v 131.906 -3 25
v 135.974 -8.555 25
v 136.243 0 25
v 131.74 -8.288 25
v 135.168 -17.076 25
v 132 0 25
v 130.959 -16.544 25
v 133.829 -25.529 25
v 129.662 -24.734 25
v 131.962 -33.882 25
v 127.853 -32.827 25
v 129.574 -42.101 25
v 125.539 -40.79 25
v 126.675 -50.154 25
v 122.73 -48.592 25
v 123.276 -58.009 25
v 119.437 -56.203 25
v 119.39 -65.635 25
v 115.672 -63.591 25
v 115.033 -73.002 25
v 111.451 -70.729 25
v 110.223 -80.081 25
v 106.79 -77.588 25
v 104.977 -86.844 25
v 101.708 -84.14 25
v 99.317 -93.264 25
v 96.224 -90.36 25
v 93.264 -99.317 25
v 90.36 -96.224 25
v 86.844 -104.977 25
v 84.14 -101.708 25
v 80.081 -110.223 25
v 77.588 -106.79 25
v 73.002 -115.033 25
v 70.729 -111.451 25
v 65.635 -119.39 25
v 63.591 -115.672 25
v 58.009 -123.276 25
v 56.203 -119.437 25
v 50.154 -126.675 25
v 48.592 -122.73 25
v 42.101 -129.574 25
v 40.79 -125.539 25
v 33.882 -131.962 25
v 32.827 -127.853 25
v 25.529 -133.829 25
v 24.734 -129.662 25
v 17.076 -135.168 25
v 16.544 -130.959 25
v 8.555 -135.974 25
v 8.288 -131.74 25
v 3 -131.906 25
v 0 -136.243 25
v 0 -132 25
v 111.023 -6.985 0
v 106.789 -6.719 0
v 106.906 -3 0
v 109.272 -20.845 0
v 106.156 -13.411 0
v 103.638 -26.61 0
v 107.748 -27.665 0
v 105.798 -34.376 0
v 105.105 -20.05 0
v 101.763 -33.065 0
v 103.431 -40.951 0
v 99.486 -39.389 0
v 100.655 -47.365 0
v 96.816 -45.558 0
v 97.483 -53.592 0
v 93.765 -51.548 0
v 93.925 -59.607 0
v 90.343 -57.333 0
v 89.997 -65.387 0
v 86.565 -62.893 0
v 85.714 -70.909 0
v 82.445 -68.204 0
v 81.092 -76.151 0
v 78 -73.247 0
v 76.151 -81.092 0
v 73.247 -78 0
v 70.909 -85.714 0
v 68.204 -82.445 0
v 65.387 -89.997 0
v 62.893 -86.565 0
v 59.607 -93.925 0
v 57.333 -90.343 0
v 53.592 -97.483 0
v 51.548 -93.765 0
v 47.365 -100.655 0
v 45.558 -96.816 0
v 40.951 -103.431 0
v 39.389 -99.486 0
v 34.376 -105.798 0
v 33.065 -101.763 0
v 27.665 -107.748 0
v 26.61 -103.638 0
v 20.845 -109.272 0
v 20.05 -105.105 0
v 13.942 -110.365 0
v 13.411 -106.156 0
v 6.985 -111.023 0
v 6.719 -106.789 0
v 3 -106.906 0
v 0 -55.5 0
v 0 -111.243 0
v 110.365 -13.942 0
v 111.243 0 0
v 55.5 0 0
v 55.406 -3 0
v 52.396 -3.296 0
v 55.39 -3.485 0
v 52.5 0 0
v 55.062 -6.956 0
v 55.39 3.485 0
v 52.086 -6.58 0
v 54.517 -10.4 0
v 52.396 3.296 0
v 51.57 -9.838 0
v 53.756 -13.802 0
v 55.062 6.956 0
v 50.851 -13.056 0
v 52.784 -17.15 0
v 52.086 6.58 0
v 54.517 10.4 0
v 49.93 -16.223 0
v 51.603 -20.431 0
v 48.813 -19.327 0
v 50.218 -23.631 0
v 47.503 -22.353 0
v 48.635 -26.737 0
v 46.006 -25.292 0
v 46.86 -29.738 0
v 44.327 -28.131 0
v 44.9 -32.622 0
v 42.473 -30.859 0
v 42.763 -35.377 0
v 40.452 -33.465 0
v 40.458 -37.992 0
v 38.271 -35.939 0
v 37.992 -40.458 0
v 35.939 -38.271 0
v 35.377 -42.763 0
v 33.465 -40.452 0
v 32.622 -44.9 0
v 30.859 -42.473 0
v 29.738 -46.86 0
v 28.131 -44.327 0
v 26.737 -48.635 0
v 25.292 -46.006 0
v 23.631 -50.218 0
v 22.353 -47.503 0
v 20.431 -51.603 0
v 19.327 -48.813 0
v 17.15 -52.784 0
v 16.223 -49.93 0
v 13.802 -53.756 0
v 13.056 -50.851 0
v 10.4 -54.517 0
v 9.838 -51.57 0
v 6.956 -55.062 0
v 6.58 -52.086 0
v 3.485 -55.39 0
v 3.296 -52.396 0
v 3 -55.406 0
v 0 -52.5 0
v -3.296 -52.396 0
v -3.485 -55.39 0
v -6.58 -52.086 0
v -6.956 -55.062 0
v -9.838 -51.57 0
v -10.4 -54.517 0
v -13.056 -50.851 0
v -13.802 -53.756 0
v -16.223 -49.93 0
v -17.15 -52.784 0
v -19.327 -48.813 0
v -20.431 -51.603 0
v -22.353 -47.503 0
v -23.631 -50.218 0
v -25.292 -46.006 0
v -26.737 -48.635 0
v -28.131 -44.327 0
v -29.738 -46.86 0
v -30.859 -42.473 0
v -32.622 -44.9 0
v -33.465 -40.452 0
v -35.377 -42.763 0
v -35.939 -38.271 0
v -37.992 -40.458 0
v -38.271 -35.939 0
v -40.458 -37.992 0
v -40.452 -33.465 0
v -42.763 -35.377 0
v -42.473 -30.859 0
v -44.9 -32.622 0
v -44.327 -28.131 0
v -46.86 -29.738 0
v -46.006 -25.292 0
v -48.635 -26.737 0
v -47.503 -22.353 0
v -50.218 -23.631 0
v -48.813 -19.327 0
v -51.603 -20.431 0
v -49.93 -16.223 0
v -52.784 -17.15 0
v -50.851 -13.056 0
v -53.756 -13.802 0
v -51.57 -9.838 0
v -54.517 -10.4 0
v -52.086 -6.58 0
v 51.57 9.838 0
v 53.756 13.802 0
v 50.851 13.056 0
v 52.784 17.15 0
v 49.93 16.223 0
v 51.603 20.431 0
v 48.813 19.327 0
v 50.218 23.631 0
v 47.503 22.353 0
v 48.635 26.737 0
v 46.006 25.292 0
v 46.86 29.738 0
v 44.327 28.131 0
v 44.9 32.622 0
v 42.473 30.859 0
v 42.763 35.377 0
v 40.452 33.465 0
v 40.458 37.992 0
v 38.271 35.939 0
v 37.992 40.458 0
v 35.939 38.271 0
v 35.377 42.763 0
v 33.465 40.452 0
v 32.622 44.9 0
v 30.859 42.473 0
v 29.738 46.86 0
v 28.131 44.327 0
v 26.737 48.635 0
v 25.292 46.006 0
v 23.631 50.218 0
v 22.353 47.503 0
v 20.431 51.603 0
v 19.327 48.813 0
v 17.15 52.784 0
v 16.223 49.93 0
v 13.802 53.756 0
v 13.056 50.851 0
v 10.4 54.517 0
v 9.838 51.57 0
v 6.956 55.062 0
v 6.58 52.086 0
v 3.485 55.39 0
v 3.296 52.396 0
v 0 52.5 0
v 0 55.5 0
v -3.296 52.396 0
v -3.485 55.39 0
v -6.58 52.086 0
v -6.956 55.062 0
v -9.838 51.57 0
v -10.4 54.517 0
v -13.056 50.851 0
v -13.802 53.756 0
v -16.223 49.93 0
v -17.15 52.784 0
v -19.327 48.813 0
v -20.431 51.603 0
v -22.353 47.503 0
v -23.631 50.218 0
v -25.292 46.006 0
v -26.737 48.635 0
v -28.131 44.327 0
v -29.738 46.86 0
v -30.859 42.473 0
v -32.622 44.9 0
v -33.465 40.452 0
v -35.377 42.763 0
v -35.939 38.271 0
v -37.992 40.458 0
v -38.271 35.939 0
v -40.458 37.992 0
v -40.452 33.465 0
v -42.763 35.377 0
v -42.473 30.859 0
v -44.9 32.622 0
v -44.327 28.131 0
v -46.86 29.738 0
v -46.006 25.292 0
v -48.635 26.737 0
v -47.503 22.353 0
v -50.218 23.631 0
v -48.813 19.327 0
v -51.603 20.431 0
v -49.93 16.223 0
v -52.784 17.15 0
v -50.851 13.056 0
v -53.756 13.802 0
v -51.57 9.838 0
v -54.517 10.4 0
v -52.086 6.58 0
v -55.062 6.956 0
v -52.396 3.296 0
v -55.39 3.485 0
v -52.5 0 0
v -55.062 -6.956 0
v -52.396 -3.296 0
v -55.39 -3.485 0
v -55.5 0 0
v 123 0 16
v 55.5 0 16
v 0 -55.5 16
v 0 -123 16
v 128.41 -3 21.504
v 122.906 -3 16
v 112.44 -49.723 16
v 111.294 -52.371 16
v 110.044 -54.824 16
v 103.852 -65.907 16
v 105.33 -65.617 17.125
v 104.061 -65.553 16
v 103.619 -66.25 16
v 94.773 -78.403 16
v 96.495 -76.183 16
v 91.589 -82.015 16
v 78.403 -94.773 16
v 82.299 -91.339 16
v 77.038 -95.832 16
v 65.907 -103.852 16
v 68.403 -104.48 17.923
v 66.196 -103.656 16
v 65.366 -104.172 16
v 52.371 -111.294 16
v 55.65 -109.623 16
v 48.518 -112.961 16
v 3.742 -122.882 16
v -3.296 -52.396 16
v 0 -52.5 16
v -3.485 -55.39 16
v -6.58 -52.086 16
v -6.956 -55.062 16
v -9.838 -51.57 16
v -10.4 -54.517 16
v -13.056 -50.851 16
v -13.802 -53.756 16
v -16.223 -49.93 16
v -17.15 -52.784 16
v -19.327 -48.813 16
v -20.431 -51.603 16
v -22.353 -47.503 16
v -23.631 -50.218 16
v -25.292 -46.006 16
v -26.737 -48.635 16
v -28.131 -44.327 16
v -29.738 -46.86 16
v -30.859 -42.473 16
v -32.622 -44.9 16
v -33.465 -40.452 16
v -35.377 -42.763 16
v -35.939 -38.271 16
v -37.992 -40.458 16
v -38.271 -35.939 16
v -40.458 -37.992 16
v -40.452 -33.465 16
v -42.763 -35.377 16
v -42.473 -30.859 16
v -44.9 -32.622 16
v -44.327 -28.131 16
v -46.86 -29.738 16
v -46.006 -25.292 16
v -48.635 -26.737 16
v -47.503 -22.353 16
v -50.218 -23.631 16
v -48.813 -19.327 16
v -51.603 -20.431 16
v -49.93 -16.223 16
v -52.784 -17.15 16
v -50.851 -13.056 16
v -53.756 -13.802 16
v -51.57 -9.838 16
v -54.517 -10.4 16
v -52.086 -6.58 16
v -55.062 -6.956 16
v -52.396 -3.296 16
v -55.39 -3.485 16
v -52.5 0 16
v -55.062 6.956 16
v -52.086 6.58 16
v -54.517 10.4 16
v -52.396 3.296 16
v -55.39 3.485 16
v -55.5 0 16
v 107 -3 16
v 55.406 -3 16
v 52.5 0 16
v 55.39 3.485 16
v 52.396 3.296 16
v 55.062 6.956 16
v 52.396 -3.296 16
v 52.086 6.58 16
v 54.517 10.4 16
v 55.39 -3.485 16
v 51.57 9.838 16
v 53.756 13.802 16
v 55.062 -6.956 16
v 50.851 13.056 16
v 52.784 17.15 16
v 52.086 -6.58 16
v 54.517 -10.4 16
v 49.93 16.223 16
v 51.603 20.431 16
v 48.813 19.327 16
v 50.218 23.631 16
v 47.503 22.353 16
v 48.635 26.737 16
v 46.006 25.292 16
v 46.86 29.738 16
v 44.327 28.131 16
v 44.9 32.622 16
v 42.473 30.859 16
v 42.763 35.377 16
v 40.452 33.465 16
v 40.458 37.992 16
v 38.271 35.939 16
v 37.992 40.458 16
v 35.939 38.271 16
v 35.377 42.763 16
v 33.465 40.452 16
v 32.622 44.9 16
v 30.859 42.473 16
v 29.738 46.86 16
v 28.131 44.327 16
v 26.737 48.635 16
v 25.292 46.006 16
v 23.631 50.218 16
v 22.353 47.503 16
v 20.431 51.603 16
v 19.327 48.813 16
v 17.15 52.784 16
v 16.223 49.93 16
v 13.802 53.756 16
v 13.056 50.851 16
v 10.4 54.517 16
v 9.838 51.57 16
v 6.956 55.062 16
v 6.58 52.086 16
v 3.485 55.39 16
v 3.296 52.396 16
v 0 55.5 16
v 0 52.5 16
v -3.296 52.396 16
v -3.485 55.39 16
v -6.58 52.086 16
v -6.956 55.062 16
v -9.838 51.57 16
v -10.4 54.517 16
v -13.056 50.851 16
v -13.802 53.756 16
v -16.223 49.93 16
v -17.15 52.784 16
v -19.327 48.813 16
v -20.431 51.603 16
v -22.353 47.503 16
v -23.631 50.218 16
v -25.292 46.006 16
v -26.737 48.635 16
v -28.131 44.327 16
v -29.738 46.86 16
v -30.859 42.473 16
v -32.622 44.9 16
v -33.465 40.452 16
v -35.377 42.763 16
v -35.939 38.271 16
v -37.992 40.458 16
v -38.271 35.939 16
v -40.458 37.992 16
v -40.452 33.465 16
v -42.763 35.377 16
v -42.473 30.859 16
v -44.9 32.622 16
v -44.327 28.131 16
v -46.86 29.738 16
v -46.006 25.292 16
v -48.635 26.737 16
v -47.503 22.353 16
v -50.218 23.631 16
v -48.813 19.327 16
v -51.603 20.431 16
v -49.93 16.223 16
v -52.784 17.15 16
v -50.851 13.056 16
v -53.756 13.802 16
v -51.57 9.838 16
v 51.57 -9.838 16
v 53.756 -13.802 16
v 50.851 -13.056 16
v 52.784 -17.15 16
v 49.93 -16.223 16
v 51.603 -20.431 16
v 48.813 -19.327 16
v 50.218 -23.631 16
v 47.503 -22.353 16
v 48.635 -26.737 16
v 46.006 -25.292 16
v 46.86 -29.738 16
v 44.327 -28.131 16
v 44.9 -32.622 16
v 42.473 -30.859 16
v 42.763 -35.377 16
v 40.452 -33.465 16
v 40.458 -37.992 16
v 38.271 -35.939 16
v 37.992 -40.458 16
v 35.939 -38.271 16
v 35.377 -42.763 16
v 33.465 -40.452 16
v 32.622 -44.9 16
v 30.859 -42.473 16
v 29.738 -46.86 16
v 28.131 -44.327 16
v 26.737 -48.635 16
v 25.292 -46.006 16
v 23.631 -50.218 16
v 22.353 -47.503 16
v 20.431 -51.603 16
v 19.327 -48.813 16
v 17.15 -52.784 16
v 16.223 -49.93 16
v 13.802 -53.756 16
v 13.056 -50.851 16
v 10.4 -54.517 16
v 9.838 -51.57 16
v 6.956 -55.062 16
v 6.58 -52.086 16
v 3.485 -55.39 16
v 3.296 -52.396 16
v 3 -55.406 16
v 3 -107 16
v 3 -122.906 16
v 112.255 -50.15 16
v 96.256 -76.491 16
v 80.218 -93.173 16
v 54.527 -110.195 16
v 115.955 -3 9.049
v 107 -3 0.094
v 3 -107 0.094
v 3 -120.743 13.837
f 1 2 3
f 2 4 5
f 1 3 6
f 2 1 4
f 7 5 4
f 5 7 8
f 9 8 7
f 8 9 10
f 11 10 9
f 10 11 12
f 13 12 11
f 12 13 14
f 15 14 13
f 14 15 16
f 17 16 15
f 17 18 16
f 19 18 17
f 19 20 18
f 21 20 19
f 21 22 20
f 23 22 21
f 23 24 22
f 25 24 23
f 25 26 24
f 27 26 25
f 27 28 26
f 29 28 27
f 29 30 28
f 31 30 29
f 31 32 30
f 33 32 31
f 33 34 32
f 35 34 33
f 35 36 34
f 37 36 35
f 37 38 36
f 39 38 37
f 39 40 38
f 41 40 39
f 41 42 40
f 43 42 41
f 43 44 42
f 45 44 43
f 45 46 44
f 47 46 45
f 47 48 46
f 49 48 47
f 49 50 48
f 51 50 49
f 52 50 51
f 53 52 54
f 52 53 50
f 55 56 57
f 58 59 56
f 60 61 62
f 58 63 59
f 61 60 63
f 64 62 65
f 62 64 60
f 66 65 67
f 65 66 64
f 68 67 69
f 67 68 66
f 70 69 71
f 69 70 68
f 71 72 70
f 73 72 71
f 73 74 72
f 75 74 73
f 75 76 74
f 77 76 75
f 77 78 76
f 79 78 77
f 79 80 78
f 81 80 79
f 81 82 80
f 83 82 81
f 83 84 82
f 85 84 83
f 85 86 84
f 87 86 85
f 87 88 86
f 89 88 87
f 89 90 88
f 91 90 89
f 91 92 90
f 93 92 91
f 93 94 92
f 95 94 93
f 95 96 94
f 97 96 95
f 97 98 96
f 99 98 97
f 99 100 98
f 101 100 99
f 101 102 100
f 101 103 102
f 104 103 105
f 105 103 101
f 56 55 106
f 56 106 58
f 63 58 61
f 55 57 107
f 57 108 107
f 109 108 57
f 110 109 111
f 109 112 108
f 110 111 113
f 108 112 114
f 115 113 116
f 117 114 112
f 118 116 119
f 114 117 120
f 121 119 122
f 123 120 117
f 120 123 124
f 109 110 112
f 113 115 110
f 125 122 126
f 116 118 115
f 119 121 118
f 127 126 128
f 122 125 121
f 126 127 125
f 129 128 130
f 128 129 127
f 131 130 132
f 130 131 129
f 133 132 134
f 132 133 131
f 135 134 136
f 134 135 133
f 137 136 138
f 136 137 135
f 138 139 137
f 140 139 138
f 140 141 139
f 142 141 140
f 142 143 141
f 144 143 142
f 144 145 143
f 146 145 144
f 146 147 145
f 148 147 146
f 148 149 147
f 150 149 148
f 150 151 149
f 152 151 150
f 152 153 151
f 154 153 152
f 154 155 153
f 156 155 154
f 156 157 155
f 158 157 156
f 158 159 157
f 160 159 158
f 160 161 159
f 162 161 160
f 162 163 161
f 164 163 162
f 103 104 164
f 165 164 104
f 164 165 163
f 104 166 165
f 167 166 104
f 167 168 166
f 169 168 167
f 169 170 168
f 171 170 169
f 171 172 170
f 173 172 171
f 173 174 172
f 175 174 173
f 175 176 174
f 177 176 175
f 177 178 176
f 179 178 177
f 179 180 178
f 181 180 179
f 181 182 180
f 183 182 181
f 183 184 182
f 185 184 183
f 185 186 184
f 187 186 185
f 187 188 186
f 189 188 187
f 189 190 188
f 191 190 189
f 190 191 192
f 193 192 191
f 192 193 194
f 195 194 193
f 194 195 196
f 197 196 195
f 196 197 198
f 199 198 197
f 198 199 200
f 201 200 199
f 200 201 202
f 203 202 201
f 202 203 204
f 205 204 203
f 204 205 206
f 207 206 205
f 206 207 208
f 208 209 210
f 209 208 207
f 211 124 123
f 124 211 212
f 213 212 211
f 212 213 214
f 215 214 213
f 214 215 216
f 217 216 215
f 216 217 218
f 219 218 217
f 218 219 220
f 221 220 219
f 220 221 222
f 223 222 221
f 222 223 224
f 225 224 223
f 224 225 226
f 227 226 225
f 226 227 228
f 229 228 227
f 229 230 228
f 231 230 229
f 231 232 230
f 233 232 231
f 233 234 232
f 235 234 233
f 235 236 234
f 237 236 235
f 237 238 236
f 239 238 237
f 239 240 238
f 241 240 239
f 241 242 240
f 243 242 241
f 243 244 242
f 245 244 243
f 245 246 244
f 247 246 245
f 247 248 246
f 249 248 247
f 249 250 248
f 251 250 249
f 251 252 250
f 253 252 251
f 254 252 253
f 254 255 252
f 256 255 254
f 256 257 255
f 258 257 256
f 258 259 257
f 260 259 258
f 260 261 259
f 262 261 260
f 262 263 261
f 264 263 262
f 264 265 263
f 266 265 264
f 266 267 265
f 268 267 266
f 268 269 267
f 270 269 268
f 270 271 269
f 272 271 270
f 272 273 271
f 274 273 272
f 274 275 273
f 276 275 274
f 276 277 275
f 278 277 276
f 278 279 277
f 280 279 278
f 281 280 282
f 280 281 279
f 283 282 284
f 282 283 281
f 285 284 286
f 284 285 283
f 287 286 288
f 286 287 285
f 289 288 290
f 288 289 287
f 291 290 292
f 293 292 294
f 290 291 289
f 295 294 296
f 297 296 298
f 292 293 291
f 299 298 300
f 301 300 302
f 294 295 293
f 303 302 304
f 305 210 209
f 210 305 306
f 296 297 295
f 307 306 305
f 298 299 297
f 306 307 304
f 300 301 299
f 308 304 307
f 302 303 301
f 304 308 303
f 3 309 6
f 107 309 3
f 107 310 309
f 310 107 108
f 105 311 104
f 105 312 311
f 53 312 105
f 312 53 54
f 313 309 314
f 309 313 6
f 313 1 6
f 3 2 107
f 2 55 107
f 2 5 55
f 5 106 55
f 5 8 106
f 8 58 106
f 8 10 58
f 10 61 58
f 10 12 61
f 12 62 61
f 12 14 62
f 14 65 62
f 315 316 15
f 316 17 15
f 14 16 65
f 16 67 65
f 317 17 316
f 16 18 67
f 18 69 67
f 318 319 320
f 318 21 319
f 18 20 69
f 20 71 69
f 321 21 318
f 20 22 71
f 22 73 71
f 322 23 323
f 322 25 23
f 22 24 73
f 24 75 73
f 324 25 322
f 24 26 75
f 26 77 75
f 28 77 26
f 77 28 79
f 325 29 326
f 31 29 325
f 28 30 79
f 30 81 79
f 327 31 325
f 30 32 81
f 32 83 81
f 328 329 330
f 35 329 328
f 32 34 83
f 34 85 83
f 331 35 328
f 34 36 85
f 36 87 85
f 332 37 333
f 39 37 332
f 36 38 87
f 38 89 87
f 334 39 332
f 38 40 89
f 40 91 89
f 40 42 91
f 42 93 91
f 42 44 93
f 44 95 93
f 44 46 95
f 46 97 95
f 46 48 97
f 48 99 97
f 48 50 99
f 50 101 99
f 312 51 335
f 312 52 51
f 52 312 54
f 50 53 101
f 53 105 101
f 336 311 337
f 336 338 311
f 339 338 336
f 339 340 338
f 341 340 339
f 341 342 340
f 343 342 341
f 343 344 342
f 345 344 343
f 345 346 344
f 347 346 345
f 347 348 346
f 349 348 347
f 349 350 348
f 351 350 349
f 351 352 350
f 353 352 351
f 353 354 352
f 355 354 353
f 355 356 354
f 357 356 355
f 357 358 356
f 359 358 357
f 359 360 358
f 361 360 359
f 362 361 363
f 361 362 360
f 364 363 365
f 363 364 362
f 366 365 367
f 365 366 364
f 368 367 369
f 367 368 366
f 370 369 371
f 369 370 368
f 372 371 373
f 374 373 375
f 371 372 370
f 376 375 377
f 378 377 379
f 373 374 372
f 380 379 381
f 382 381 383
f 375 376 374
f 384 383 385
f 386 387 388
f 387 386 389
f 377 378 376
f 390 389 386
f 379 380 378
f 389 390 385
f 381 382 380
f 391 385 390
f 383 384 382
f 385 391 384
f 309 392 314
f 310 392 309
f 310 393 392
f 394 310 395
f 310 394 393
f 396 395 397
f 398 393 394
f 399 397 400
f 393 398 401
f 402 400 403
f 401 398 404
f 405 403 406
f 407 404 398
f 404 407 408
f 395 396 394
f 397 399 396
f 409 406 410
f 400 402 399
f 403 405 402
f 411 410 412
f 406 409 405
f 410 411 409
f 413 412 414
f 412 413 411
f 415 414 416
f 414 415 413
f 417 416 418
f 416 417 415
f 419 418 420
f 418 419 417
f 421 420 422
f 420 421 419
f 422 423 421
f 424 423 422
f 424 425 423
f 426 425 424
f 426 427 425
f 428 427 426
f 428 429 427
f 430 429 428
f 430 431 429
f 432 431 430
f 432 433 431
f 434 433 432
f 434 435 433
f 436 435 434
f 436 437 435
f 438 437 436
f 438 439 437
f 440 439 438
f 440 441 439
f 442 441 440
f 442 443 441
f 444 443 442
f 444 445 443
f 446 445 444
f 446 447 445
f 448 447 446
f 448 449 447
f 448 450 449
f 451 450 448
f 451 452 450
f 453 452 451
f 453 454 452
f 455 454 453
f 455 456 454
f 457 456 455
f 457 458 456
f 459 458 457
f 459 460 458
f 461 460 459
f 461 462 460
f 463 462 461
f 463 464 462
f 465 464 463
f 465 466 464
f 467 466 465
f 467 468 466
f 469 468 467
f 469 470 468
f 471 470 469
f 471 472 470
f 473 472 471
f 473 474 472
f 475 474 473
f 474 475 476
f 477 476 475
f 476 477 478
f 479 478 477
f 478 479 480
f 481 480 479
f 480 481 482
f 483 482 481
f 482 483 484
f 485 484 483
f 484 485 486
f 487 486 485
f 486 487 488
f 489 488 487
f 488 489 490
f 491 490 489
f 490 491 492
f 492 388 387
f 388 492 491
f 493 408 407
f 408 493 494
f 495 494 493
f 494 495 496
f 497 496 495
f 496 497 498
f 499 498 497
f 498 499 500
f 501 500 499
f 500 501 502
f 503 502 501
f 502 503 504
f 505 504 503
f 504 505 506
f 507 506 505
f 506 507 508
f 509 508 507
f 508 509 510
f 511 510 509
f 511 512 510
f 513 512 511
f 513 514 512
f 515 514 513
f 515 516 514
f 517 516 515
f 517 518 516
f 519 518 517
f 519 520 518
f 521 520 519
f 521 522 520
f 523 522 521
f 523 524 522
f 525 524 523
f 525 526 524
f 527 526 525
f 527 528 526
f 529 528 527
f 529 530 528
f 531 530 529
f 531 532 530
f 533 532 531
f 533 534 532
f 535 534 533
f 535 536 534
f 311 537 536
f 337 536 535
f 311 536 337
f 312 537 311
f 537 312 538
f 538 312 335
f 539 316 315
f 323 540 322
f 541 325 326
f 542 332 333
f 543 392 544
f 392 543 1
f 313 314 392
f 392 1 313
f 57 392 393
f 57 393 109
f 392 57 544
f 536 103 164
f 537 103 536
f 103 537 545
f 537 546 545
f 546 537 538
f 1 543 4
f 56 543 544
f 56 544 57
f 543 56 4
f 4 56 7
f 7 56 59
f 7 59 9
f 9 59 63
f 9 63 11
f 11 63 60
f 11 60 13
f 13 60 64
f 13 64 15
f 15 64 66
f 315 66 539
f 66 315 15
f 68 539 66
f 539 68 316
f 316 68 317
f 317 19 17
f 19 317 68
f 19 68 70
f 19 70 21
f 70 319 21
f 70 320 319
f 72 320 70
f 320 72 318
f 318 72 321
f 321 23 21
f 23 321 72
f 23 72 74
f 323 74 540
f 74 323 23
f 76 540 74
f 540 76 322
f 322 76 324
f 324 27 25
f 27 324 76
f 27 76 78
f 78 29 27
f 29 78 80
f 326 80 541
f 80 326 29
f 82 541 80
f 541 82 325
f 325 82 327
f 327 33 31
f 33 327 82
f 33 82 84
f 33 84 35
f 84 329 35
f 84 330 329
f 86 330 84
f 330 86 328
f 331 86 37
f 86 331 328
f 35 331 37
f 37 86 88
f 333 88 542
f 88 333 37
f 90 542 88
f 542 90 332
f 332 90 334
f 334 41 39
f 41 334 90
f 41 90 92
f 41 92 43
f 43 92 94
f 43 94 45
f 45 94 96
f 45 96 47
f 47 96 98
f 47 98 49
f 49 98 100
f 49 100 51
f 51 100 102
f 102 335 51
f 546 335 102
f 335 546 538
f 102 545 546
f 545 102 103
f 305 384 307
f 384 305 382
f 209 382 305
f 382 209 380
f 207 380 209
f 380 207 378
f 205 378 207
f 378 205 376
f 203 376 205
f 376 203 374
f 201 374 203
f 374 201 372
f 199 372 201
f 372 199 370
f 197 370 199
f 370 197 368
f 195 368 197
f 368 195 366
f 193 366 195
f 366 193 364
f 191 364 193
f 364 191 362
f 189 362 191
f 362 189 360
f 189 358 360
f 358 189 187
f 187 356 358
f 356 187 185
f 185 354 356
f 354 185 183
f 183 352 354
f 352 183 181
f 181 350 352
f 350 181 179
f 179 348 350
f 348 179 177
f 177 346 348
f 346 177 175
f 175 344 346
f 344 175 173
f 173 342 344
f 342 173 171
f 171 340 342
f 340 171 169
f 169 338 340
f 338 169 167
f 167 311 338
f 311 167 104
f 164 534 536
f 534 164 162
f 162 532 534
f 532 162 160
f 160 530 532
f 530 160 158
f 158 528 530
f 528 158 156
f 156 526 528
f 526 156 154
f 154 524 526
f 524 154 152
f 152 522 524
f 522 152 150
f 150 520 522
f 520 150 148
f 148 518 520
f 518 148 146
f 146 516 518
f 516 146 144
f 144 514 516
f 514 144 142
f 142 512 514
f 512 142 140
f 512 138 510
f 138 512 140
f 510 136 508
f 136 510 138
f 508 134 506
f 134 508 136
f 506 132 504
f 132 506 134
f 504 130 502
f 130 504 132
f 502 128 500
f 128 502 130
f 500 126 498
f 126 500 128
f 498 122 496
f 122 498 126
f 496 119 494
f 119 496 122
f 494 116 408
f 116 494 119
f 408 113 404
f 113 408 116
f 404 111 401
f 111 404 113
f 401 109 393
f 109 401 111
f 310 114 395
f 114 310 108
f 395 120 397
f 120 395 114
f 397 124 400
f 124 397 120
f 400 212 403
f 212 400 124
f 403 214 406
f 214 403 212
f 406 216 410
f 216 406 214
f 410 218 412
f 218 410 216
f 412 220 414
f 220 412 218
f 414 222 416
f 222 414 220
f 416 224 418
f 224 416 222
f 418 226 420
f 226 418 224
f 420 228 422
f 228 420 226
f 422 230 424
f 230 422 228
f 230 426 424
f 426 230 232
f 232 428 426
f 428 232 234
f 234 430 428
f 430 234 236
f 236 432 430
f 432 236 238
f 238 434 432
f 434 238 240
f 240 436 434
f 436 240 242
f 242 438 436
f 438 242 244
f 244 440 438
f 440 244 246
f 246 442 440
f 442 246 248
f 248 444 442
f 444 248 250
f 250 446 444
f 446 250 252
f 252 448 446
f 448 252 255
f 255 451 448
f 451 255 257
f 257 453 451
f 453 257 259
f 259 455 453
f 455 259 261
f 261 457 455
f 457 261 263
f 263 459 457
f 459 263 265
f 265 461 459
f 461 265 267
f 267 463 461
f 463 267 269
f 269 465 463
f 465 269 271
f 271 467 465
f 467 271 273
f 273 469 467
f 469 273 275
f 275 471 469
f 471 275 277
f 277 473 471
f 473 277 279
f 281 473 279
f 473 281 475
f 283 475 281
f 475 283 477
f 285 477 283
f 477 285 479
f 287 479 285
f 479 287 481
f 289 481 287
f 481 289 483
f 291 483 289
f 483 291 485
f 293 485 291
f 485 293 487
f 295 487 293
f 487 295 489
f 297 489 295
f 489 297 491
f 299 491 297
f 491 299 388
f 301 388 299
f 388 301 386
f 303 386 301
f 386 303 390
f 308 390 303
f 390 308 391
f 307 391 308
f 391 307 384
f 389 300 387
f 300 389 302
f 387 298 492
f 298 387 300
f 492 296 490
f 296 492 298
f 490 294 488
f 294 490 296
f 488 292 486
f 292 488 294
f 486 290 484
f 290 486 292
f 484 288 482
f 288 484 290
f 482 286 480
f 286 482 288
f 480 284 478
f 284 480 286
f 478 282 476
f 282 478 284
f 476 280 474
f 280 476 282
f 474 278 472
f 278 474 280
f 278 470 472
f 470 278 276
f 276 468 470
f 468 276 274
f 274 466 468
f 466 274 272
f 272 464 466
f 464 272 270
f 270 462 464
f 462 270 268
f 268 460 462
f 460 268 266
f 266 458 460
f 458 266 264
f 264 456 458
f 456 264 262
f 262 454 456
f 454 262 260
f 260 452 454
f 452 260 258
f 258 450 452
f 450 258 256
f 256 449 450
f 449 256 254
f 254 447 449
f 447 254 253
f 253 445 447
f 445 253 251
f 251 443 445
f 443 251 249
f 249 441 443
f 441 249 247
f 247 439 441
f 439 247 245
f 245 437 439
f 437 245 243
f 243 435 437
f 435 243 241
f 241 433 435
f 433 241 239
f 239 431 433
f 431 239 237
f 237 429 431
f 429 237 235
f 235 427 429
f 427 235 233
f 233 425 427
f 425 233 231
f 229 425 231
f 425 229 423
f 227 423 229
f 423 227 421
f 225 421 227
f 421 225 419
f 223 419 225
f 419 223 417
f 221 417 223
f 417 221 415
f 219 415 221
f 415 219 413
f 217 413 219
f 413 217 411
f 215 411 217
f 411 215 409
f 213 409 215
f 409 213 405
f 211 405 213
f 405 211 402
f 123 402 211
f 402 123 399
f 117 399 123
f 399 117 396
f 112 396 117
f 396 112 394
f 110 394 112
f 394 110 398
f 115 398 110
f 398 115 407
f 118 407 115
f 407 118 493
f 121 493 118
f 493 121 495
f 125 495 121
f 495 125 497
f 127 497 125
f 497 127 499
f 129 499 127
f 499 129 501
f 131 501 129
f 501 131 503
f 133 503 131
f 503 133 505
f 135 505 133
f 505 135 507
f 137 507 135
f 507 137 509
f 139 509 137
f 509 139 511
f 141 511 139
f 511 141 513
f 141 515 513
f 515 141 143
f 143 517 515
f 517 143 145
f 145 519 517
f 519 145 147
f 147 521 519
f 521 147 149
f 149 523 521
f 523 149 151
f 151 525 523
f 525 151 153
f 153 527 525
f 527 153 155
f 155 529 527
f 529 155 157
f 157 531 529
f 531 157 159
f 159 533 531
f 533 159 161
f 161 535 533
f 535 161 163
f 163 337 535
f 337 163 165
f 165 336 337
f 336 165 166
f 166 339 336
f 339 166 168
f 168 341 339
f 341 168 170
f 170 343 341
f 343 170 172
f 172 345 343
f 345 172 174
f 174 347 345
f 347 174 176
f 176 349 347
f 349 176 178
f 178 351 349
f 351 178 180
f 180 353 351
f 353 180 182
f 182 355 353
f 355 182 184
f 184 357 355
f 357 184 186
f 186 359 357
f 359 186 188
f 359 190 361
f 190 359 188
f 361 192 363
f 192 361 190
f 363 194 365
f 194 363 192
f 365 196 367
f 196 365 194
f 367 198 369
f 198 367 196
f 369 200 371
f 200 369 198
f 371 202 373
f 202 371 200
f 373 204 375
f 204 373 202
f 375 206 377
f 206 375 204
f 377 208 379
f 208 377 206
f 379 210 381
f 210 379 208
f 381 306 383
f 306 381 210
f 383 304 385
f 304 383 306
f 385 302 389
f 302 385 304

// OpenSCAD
//  Amount of segments in a circle
$fn = 100;

//  Radius of the ring on your KitchenAid
mountRadius = 52.5;

//  Height of the attachment ring
mountHeight = 16;

//  Inner radius of your bowl
funnelBaseRadius = 107;

//  Overhang of the funnel at the top
funnelTopOverhang = 25;

funnelHeight = 25;

//  Wall thickness
thickness = 3;

//  Thickness of the bowl
outerThickness = 6;

rotate([0, 0, -90])
{
    funnelAssembly();
}

module funnelAssembly()
{
    union()
    {
        mountBase();
        funnel();
    }
}

module mountBase()
{
    linear_extrude(height = mountHeight)
    {
        difference()
        {
            union()
            {
                circle(r = mountRadius + thickness);
                square(funnelBaseRadius);
            }
            circle(r = mountRadius);
            difference()
            {
                translate([thickness, thickness, 0])
                {
                    square(funnelBaseRadius);
                }
                circle(r = mountRadius + thickness);
            }
        }
    }
}

module funnel()
{
    funnelAngle = atan(funnelHeight / funnelTopOverhang);
    tx = thickness / sin(funnelAngle);
    
    difference()
    {
        intersection()
        {
            cube([funnelBaseRadius + funnelTopOverhang + tx, funnelBaseRadius + funnelTopOverhang + tx, funnelHeight]);
            rotate_extrude()
            {
                rotate([0, 0, 0])
                {
                    polygon(    points  =   [   [funnelBaseRadius, 0],
                                                [funnelBaseRadius + tx, 0],
                                                [funnelBaseRadius + tx + funnelTopOverhang, funnelHeight],
                                                [funnelBaseRadius + funnelTopOverhang, funnelHeight],
                                                [funnelBaseRadius + mountHeight / tan(funnelAngle), mountHeight],
                                                [funnelBaseRadius, mountHeight],
                                            ]);
                }
            }
        }
        intersection()
        {
            translate([thickness, thickness, 0])
            {
                cube([funnelBaseRadius + funnelTopOverhang + tx, funnelBaseRadius + funnelTopOverhang + tx, funnelHeight]);
            }
            rotate_extrude()
            {
                rotate([0, 0, 0])
                {
                    polygon(    points  =   [   [funnelBaseRadius, 0],
                                                [funnelBaseRadius, funnelHeight],
                                                [funnelBaseRadius + funnelTopOverhang, funnelHeight],
                                            ]);
                }
            }
        }
    }
}
